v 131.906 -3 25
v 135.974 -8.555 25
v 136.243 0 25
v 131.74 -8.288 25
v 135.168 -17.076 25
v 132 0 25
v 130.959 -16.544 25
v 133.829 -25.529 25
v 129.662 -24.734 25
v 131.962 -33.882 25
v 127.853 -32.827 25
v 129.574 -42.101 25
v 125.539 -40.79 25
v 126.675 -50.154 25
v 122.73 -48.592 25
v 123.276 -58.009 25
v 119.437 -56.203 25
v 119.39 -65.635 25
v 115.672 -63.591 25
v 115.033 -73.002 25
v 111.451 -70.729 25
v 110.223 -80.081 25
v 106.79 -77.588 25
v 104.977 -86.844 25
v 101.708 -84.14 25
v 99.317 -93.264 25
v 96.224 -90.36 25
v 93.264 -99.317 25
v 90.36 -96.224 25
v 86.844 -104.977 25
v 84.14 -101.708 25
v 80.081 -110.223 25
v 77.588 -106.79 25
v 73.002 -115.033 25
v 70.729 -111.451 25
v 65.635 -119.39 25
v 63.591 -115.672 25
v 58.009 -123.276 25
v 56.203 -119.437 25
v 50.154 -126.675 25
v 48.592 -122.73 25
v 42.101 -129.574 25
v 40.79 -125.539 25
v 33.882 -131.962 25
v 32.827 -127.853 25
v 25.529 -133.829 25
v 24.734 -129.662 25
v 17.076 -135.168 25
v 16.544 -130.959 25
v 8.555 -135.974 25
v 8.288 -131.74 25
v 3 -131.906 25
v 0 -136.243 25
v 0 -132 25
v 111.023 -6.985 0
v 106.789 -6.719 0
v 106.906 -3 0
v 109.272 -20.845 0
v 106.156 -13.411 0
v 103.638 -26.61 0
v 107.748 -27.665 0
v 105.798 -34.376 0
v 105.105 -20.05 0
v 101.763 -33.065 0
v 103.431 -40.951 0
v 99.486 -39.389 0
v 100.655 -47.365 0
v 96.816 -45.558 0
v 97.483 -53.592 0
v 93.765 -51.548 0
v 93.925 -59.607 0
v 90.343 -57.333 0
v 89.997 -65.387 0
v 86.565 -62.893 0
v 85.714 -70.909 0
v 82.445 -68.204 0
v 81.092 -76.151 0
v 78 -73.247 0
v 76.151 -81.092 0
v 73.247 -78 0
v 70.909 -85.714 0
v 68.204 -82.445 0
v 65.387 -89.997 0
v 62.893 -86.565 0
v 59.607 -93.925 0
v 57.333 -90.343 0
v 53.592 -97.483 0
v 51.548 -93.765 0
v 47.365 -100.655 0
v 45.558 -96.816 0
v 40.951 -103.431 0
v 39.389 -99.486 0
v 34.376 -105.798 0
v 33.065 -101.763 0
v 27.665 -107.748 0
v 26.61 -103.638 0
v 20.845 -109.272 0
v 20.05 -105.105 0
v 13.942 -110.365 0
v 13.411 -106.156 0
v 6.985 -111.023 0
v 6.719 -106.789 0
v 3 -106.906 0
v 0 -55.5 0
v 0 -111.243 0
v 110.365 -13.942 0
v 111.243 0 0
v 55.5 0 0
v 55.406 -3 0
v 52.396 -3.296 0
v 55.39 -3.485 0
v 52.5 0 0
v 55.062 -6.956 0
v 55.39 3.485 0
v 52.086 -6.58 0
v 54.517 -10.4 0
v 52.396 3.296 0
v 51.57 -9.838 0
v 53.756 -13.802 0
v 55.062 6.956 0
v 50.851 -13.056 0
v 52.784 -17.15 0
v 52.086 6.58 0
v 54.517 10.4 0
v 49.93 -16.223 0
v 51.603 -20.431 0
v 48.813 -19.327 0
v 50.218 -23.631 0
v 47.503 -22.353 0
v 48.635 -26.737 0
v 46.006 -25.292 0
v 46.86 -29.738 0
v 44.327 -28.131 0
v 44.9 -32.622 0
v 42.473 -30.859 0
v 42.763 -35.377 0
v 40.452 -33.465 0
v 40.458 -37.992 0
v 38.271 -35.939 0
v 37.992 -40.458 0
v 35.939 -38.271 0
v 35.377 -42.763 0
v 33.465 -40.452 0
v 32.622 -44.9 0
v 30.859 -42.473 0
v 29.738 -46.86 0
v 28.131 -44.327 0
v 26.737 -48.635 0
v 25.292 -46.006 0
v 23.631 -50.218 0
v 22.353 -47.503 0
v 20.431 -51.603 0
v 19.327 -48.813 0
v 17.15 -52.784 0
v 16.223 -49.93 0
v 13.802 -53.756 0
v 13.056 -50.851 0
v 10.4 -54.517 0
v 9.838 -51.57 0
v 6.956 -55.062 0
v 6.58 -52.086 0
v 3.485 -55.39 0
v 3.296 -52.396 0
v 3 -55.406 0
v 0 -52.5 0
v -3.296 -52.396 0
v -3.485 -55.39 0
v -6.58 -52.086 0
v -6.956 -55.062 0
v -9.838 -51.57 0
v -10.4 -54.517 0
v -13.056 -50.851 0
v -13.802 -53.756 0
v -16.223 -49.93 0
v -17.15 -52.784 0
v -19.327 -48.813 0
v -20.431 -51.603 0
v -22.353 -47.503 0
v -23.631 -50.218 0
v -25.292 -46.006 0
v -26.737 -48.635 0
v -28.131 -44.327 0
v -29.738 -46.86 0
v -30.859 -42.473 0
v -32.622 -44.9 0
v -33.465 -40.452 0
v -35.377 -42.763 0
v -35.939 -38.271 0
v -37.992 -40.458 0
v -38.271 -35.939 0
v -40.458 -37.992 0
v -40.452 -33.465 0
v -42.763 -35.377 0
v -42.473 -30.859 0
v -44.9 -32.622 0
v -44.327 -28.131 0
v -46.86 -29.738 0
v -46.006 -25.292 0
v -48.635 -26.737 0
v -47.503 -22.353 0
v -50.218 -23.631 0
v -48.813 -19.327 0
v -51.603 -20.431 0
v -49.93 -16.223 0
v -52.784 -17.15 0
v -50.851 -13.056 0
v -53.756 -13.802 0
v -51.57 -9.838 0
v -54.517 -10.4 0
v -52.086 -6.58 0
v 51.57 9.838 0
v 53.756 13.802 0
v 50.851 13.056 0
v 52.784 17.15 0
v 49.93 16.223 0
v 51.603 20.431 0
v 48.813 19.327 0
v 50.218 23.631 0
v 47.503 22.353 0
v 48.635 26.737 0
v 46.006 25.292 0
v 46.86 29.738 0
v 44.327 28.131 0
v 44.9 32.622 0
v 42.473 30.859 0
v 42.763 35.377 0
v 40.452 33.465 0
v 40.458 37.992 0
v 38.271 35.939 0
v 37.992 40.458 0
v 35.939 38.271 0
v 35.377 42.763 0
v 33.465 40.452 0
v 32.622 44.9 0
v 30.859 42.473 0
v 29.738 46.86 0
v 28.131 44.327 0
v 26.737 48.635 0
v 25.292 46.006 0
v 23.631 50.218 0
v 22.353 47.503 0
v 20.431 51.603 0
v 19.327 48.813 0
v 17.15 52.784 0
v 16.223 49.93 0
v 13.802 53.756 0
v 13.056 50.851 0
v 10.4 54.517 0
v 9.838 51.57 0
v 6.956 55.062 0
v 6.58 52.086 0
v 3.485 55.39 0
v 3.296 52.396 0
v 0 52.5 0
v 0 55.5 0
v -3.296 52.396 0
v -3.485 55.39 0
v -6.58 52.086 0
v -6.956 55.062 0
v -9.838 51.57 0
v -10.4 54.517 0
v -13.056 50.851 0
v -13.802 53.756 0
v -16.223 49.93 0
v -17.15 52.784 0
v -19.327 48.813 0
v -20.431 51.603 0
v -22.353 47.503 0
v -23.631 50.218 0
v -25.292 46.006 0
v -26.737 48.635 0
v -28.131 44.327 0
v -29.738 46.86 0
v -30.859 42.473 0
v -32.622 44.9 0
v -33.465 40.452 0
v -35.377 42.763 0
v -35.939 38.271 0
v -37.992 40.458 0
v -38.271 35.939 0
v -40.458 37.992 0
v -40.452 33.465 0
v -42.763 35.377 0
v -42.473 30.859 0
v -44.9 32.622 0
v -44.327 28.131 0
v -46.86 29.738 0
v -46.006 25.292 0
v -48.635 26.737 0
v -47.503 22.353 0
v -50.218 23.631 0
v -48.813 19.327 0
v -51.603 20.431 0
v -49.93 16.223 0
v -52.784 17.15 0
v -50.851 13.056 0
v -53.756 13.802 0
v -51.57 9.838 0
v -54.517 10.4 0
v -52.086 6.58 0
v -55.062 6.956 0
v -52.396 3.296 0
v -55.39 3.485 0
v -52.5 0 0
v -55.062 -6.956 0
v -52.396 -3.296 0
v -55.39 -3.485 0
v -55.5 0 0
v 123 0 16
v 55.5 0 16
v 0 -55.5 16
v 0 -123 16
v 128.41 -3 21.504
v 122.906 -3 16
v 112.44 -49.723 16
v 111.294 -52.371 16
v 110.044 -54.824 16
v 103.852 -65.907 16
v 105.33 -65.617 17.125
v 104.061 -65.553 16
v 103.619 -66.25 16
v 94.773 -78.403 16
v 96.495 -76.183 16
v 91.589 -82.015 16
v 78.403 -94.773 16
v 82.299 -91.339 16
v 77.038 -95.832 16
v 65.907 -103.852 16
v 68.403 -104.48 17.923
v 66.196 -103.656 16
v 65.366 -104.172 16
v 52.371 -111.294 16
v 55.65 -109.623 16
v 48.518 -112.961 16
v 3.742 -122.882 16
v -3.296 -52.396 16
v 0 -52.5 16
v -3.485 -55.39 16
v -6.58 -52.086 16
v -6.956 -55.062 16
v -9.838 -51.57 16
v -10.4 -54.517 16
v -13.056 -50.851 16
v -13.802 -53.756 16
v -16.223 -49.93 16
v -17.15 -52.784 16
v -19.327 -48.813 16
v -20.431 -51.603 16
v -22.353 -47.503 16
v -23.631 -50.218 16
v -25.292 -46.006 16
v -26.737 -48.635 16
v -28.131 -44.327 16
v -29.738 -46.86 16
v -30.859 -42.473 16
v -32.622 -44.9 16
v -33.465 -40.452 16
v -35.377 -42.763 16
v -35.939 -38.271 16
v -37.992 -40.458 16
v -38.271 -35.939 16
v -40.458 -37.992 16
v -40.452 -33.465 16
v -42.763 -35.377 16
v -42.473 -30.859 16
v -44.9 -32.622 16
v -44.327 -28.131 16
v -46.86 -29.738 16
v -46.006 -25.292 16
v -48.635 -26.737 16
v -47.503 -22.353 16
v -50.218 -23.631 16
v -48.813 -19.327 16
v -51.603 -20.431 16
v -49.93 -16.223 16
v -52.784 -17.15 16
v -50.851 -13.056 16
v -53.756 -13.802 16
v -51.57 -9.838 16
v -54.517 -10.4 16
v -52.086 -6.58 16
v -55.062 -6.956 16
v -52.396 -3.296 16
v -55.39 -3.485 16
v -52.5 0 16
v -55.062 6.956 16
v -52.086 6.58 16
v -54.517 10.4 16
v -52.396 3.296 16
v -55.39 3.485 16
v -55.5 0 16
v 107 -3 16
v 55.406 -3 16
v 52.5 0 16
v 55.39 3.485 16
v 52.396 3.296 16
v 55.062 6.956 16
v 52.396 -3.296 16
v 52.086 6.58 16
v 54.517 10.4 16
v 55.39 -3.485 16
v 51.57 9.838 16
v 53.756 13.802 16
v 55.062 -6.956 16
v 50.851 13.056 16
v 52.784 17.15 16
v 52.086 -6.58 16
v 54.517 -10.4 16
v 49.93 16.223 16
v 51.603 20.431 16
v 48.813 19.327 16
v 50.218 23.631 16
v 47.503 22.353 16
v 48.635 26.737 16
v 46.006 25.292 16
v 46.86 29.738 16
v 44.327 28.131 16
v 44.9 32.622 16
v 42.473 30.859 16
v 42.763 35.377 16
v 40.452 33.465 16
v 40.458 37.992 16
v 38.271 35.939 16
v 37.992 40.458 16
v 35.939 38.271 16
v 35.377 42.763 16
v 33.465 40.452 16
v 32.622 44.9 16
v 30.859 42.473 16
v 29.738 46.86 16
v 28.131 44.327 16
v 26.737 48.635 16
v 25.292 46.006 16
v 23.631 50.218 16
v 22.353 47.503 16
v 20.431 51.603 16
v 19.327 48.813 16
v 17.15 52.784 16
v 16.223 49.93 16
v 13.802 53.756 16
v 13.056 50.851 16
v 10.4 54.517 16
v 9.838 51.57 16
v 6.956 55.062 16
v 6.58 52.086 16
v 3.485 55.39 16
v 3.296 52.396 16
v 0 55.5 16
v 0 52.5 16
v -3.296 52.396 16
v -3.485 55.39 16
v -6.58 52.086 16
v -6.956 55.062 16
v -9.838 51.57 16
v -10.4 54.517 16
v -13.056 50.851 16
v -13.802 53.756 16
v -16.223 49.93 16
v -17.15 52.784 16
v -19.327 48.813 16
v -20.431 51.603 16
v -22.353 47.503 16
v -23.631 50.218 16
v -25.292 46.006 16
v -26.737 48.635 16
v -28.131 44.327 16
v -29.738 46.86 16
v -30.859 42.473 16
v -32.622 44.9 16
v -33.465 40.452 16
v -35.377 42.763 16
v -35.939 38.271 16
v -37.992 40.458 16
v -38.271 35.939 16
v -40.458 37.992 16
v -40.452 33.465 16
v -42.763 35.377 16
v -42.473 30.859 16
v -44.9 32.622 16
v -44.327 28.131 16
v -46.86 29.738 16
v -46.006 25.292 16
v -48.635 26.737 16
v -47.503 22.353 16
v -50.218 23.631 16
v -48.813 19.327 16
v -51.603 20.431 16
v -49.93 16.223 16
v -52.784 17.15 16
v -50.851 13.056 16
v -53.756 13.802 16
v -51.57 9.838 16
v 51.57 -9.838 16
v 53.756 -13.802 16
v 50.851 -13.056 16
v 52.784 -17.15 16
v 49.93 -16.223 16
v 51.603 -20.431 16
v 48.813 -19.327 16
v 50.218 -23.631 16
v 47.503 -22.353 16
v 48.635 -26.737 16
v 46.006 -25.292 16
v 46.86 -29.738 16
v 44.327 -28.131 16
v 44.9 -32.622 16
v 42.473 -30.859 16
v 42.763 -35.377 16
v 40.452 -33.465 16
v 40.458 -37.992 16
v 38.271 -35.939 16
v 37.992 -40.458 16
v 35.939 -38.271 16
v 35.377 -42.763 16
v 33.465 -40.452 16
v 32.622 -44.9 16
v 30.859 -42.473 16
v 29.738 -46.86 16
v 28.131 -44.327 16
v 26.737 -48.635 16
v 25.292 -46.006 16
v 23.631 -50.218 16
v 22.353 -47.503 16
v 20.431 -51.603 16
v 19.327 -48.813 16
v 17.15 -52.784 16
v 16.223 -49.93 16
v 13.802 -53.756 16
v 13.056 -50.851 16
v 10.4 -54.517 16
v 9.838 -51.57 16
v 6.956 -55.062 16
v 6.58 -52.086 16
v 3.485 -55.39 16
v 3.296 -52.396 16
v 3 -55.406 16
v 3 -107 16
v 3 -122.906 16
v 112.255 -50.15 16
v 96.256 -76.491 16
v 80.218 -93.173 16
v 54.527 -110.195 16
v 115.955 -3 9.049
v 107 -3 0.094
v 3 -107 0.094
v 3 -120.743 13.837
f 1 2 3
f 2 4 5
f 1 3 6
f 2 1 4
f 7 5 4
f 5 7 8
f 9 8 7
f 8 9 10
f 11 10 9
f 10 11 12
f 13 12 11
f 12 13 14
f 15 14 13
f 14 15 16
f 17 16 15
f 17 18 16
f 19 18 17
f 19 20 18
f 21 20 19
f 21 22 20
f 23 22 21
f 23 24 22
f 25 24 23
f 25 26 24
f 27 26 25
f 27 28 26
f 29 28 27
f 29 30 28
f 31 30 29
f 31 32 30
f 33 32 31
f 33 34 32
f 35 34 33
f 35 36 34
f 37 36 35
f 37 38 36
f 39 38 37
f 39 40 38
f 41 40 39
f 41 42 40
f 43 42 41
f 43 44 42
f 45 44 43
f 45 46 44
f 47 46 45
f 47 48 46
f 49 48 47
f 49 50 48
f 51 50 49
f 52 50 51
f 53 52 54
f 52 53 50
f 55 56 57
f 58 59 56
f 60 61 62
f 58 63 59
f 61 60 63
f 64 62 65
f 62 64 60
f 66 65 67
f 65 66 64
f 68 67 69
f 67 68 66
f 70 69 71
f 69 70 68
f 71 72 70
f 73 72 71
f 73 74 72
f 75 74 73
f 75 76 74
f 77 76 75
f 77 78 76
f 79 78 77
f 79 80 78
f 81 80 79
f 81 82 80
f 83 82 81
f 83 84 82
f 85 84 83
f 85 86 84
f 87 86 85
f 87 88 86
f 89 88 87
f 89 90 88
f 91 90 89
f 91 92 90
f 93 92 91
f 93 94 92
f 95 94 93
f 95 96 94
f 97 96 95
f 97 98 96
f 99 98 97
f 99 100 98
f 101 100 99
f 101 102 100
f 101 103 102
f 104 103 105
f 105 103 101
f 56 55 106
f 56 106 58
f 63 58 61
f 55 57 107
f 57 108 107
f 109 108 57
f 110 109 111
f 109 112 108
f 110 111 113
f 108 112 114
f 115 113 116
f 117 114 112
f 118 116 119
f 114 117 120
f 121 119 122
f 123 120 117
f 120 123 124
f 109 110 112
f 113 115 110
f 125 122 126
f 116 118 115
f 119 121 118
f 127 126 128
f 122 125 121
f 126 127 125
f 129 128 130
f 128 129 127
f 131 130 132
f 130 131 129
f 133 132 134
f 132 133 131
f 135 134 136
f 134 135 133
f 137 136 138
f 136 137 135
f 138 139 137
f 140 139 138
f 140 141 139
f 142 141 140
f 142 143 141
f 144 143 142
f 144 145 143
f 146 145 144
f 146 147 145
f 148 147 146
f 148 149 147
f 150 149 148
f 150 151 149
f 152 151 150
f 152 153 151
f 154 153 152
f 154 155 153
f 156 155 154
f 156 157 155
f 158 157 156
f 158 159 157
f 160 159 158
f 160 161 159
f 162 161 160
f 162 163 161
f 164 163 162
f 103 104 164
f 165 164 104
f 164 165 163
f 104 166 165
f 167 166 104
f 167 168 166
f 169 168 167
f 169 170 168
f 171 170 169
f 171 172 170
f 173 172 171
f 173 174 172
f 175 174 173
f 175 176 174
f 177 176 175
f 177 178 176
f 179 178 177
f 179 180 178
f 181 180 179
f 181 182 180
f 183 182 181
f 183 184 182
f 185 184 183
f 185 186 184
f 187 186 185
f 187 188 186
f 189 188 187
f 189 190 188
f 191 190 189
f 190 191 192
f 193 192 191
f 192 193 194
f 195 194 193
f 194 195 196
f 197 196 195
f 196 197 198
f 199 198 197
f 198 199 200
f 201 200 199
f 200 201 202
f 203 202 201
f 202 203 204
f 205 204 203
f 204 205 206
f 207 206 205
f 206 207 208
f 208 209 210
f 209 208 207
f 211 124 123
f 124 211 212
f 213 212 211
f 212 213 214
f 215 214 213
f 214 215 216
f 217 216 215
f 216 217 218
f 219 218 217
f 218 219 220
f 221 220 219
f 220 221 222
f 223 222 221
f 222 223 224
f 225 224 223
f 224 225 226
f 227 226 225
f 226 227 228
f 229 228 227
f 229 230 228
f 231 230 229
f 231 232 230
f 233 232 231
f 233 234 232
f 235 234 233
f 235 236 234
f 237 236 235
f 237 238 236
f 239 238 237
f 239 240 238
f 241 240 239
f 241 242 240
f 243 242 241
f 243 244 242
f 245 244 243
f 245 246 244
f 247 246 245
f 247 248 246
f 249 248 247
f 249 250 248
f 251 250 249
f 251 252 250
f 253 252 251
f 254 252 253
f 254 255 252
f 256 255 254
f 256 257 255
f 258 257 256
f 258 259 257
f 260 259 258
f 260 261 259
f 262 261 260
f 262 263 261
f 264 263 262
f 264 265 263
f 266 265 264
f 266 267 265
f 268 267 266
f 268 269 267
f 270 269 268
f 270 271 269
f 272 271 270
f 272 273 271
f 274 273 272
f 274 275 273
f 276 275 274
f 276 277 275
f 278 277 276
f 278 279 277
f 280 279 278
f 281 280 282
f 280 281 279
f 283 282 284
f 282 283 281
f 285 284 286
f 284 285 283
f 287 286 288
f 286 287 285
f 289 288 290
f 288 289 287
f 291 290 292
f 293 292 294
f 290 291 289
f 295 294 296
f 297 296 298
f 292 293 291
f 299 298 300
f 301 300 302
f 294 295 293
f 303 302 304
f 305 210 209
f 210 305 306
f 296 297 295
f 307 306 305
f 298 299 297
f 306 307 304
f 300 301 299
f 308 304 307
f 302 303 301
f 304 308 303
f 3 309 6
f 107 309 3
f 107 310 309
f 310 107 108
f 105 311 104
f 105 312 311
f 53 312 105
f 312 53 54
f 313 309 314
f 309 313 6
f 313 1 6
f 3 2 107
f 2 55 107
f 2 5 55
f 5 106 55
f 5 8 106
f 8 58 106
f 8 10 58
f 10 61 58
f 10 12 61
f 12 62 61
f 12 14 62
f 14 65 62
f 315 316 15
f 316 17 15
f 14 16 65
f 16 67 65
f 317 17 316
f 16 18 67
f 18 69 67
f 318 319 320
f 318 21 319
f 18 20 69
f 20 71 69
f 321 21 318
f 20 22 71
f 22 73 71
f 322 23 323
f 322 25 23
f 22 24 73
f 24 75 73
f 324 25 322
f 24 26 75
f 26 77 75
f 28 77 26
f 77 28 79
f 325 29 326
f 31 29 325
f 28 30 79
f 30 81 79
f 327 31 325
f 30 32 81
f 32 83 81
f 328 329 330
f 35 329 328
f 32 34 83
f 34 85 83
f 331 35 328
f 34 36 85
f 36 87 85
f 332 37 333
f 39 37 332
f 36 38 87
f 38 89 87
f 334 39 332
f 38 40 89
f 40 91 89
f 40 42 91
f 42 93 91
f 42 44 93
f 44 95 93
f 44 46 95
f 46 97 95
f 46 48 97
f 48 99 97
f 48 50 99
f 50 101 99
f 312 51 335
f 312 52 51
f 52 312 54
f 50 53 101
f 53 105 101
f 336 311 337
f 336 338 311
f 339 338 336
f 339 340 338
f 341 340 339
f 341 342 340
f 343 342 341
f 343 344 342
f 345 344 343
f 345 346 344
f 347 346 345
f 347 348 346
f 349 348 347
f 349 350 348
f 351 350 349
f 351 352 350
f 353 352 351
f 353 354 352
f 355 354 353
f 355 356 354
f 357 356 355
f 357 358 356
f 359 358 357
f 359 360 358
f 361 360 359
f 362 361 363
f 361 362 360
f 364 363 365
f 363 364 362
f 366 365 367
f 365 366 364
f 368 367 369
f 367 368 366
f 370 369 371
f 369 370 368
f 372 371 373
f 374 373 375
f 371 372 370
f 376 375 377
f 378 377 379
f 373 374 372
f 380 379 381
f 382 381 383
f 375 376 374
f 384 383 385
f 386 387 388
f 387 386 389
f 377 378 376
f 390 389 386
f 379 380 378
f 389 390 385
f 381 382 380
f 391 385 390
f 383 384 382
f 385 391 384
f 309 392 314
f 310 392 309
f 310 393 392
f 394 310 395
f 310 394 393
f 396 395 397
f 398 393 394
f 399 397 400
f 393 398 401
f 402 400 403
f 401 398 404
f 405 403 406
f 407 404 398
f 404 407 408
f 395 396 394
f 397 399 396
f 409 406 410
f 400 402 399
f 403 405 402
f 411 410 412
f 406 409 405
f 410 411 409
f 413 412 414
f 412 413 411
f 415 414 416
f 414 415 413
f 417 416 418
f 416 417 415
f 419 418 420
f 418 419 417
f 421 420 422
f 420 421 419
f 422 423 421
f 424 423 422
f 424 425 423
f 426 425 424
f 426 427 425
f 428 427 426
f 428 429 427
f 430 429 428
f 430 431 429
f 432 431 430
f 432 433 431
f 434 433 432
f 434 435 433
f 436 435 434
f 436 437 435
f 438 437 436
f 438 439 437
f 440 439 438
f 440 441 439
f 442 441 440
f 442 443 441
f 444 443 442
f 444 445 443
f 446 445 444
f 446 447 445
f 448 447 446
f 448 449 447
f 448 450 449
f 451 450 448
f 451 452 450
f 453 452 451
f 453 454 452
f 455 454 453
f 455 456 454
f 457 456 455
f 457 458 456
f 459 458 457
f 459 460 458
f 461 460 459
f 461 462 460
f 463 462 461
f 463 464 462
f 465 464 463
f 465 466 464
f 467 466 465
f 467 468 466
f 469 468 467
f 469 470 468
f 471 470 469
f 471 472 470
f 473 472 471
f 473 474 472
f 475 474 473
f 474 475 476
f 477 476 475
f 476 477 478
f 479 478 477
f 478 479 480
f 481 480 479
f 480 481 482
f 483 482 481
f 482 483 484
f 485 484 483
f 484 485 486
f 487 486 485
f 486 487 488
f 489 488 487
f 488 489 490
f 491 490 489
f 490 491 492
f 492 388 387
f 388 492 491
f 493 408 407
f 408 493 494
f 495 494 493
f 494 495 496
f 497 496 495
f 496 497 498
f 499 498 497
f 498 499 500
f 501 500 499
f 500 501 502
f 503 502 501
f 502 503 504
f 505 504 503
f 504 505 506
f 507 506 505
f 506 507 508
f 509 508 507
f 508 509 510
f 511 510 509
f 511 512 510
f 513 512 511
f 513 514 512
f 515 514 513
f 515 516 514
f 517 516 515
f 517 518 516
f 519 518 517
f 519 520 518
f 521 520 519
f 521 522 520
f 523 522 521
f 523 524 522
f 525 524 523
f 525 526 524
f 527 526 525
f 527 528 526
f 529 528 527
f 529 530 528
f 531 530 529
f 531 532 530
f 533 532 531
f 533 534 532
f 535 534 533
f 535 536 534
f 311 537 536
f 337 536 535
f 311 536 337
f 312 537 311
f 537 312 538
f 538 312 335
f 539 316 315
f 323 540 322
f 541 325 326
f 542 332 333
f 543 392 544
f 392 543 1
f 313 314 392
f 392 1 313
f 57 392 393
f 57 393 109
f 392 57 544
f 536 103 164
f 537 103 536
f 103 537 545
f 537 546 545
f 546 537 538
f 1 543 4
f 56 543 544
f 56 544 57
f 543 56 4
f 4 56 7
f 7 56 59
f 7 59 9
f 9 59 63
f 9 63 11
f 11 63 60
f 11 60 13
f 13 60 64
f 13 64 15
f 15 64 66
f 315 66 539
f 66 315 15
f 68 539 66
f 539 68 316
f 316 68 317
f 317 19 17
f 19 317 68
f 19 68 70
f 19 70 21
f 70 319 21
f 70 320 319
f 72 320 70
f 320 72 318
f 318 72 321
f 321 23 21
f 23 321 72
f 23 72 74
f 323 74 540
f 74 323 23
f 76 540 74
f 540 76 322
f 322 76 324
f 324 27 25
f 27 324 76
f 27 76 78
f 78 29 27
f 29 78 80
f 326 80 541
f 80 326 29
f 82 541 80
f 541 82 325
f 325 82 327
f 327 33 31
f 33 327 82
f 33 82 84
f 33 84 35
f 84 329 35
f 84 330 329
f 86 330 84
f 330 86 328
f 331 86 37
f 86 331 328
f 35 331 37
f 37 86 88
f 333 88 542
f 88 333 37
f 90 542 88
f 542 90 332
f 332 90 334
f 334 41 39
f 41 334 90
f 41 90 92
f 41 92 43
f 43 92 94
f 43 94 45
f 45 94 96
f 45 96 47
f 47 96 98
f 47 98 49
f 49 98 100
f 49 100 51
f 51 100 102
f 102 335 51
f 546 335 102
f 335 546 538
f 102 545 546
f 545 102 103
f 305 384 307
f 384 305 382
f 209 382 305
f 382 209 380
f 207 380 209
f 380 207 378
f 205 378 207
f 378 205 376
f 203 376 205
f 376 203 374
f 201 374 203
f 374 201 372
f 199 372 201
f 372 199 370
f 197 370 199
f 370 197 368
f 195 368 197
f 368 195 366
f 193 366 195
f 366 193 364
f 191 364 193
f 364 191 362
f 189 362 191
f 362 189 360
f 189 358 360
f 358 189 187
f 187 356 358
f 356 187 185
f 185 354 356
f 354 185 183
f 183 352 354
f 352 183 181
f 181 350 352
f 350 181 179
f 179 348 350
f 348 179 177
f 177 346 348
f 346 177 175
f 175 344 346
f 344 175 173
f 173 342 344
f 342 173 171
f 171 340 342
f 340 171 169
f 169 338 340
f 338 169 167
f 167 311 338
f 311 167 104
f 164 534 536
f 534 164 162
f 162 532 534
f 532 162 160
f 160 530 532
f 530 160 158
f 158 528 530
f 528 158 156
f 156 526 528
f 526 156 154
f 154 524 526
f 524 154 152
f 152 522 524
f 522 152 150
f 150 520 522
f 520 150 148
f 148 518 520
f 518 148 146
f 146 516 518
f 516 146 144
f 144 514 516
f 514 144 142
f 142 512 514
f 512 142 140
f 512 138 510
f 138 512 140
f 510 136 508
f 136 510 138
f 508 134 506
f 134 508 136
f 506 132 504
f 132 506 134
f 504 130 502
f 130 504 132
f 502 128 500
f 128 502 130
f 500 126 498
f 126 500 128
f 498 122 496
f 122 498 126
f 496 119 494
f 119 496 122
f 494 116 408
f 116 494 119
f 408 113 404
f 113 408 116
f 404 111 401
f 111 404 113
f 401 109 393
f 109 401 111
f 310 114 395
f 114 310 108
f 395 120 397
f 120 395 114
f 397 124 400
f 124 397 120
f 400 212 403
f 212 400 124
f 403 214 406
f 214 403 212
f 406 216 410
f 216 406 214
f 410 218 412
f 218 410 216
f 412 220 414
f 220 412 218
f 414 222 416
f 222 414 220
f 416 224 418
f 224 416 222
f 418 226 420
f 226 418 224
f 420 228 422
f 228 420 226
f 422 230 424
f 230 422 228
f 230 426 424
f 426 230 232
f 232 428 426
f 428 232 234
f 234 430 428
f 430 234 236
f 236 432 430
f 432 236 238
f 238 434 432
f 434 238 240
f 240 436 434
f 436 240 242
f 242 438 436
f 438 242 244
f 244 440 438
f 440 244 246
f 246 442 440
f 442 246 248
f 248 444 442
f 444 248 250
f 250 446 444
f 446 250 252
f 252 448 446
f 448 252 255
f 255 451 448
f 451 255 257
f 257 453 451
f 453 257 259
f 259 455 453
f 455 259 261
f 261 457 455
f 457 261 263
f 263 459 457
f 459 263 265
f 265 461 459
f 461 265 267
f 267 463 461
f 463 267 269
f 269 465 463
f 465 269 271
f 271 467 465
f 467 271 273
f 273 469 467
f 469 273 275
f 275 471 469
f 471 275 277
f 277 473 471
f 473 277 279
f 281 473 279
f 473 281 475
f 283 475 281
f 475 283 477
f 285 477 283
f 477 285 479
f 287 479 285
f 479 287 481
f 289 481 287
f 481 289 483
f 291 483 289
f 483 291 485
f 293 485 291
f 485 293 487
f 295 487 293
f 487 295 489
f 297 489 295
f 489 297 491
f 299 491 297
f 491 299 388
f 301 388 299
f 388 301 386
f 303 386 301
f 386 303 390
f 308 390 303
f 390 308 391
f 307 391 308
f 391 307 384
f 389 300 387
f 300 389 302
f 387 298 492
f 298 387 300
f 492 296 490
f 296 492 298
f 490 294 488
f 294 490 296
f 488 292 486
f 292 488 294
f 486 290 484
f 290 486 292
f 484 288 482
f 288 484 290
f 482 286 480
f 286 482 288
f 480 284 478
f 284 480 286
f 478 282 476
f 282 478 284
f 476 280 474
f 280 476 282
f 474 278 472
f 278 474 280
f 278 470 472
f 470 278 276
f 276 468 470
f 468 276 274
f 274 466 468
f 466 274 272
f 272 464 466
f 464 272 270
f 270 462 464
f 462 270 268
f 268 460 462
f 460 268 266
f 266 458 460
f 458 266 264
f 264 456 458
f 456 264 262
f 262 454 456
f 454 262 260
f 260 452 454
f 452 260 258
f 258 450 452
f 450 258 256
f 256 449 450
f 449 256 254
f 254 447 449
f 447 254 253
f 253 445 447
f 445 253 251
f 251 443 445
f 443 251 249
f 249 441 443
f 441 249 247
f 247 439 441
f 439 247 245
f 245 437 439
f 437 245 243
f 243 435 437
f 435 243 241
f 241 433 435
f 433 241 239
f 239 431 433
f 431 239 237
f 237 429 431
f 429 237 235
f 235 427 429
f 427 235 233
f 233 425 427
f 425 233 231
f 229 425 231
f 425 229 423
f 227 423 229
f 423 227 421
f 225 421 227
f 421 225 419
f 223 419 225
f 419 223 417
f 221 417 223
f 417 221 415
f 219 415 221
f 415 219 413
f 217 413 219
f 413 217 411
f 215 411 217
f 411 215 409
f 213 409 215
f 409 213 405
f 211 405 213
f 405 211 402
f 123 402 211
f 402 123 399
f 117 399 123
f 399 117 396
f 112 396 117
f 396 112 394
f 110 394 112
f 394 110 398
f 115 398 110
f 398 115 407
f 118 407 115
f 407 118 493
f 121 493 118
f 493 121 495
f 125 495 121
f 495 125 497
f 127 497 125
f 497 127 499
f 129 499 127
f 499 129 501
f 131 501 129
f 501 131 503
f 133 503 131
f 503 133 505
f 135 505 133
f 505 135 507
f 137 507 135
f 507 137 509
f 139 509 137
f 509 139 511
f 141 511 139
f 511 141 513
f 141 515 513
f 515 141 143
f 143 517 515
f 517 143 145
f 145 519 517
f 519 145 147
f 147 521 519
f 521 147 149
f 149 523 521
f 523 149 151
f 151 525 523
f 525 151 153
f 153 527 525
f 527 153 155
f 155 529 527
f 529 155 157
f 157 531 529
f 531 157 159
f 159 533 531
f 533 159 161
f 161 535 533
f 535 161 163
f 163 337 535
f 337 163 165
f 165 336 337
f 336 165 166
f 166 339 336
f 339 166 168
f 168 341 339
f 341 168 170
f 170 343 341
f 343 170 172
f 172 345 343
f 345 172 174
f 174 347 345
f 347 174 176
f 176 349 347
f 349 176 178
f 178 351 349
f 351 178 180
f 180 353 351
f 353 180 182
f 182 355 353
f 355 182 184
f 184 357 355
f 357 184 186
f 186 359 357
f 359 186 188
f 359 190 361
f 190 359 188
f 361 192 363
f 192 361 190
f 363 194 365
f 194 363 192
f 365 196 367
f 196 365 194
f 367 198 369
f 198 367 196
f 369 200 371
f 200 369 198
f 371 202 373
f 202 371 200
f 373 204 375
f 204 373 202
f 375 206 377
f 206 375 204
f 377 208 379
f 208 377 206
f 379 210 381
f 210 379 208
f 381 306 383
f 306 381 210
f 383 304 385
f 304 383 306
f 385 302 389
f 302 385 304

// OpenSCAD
//  Amount of segments in a circle
$fn = 100;

//  Radius of the ring on your KitchenAid
mountRadius = 52.5;

//  Height of the attachment ring
mountHeight = 16;

//  Inner radius of your bowl
funnelBaseRadius = 107;

//  Overhang of the funnel at the top
funnelTopOverhang = 25;

funnelHeight = 25;

//  Wall thickness
thickness = 3;

//  Thickness of the bowl
outerThickness = 6;

rotate([0, 0, -90])
{
    funnelAssembly();
}

module funnelAssembly()
{
    union()
    {
        mountBase();
        funnel();
    }
}

module mountBase()
{
    linear_extrude(height = mountHeight)
    {
        difference()
        {
            union()
            {
                circle(r = mountRadius + thickness);
                square(funnelBaseRadius);
            }
            circle(r = mountRadius);
            difference()
            {
                translate([thickness, thickness, 0])
                {
                    square(funnelBaseRadius);
                }
                circle(r = mountRadius + thickness);
            }
        }
    }
}

module funnel()
{
    funnelAngle = atan(funnelHeight / funnelTopOverhang);
    tx = thickness / sin(funnelAngle);
    
    difference()
    {
        intersection()
        {
            cube([funnelBaseRadius + funnelTopOverhang + tx, funnelBaseRadius + funnelTopOverhang + tx, funnelHeight]);
            rotate_extrude()
            {
                rotate([0, 0, 0])
                {
                    polygon(    points  =   [   [funnelBaseRadius, 0],
                                                [funnelBaseRadius + tx, 0],
                                                [funnelBaseRadius + tx + funnelTopOverhang, funnelHeight],
                                                [funnelBaseRadius + funnelTopOverhang, funnelHeight],
                                                [funnelBaseRadius + mountHeight / tan(funnelAngle), mountHeight],
                                                [funnelBaseRadius, mountHeight],
                                            ]);
                }
            }
        }
        intersection()
        {
            translate([thickness, thickness, 0])
            {
                cube([funnelBaseRadius + funnelTopOverhang + tx, funnelBaseRadius + funnelTopOverhang + tx, funnelHeight]);
            }
            rotate_extrude()
            {
                rotate([0, 0, 0])
                {
                    polygon(    points  =   [   [funnelBaseRadius, 0],
                                                [funnelBaseRadius, funnelHeight],
                                                [funnelBaseRadius + funnelTopOverhang, funnelHeight],
                                            ]);
                }
            }
        }
    }
}
